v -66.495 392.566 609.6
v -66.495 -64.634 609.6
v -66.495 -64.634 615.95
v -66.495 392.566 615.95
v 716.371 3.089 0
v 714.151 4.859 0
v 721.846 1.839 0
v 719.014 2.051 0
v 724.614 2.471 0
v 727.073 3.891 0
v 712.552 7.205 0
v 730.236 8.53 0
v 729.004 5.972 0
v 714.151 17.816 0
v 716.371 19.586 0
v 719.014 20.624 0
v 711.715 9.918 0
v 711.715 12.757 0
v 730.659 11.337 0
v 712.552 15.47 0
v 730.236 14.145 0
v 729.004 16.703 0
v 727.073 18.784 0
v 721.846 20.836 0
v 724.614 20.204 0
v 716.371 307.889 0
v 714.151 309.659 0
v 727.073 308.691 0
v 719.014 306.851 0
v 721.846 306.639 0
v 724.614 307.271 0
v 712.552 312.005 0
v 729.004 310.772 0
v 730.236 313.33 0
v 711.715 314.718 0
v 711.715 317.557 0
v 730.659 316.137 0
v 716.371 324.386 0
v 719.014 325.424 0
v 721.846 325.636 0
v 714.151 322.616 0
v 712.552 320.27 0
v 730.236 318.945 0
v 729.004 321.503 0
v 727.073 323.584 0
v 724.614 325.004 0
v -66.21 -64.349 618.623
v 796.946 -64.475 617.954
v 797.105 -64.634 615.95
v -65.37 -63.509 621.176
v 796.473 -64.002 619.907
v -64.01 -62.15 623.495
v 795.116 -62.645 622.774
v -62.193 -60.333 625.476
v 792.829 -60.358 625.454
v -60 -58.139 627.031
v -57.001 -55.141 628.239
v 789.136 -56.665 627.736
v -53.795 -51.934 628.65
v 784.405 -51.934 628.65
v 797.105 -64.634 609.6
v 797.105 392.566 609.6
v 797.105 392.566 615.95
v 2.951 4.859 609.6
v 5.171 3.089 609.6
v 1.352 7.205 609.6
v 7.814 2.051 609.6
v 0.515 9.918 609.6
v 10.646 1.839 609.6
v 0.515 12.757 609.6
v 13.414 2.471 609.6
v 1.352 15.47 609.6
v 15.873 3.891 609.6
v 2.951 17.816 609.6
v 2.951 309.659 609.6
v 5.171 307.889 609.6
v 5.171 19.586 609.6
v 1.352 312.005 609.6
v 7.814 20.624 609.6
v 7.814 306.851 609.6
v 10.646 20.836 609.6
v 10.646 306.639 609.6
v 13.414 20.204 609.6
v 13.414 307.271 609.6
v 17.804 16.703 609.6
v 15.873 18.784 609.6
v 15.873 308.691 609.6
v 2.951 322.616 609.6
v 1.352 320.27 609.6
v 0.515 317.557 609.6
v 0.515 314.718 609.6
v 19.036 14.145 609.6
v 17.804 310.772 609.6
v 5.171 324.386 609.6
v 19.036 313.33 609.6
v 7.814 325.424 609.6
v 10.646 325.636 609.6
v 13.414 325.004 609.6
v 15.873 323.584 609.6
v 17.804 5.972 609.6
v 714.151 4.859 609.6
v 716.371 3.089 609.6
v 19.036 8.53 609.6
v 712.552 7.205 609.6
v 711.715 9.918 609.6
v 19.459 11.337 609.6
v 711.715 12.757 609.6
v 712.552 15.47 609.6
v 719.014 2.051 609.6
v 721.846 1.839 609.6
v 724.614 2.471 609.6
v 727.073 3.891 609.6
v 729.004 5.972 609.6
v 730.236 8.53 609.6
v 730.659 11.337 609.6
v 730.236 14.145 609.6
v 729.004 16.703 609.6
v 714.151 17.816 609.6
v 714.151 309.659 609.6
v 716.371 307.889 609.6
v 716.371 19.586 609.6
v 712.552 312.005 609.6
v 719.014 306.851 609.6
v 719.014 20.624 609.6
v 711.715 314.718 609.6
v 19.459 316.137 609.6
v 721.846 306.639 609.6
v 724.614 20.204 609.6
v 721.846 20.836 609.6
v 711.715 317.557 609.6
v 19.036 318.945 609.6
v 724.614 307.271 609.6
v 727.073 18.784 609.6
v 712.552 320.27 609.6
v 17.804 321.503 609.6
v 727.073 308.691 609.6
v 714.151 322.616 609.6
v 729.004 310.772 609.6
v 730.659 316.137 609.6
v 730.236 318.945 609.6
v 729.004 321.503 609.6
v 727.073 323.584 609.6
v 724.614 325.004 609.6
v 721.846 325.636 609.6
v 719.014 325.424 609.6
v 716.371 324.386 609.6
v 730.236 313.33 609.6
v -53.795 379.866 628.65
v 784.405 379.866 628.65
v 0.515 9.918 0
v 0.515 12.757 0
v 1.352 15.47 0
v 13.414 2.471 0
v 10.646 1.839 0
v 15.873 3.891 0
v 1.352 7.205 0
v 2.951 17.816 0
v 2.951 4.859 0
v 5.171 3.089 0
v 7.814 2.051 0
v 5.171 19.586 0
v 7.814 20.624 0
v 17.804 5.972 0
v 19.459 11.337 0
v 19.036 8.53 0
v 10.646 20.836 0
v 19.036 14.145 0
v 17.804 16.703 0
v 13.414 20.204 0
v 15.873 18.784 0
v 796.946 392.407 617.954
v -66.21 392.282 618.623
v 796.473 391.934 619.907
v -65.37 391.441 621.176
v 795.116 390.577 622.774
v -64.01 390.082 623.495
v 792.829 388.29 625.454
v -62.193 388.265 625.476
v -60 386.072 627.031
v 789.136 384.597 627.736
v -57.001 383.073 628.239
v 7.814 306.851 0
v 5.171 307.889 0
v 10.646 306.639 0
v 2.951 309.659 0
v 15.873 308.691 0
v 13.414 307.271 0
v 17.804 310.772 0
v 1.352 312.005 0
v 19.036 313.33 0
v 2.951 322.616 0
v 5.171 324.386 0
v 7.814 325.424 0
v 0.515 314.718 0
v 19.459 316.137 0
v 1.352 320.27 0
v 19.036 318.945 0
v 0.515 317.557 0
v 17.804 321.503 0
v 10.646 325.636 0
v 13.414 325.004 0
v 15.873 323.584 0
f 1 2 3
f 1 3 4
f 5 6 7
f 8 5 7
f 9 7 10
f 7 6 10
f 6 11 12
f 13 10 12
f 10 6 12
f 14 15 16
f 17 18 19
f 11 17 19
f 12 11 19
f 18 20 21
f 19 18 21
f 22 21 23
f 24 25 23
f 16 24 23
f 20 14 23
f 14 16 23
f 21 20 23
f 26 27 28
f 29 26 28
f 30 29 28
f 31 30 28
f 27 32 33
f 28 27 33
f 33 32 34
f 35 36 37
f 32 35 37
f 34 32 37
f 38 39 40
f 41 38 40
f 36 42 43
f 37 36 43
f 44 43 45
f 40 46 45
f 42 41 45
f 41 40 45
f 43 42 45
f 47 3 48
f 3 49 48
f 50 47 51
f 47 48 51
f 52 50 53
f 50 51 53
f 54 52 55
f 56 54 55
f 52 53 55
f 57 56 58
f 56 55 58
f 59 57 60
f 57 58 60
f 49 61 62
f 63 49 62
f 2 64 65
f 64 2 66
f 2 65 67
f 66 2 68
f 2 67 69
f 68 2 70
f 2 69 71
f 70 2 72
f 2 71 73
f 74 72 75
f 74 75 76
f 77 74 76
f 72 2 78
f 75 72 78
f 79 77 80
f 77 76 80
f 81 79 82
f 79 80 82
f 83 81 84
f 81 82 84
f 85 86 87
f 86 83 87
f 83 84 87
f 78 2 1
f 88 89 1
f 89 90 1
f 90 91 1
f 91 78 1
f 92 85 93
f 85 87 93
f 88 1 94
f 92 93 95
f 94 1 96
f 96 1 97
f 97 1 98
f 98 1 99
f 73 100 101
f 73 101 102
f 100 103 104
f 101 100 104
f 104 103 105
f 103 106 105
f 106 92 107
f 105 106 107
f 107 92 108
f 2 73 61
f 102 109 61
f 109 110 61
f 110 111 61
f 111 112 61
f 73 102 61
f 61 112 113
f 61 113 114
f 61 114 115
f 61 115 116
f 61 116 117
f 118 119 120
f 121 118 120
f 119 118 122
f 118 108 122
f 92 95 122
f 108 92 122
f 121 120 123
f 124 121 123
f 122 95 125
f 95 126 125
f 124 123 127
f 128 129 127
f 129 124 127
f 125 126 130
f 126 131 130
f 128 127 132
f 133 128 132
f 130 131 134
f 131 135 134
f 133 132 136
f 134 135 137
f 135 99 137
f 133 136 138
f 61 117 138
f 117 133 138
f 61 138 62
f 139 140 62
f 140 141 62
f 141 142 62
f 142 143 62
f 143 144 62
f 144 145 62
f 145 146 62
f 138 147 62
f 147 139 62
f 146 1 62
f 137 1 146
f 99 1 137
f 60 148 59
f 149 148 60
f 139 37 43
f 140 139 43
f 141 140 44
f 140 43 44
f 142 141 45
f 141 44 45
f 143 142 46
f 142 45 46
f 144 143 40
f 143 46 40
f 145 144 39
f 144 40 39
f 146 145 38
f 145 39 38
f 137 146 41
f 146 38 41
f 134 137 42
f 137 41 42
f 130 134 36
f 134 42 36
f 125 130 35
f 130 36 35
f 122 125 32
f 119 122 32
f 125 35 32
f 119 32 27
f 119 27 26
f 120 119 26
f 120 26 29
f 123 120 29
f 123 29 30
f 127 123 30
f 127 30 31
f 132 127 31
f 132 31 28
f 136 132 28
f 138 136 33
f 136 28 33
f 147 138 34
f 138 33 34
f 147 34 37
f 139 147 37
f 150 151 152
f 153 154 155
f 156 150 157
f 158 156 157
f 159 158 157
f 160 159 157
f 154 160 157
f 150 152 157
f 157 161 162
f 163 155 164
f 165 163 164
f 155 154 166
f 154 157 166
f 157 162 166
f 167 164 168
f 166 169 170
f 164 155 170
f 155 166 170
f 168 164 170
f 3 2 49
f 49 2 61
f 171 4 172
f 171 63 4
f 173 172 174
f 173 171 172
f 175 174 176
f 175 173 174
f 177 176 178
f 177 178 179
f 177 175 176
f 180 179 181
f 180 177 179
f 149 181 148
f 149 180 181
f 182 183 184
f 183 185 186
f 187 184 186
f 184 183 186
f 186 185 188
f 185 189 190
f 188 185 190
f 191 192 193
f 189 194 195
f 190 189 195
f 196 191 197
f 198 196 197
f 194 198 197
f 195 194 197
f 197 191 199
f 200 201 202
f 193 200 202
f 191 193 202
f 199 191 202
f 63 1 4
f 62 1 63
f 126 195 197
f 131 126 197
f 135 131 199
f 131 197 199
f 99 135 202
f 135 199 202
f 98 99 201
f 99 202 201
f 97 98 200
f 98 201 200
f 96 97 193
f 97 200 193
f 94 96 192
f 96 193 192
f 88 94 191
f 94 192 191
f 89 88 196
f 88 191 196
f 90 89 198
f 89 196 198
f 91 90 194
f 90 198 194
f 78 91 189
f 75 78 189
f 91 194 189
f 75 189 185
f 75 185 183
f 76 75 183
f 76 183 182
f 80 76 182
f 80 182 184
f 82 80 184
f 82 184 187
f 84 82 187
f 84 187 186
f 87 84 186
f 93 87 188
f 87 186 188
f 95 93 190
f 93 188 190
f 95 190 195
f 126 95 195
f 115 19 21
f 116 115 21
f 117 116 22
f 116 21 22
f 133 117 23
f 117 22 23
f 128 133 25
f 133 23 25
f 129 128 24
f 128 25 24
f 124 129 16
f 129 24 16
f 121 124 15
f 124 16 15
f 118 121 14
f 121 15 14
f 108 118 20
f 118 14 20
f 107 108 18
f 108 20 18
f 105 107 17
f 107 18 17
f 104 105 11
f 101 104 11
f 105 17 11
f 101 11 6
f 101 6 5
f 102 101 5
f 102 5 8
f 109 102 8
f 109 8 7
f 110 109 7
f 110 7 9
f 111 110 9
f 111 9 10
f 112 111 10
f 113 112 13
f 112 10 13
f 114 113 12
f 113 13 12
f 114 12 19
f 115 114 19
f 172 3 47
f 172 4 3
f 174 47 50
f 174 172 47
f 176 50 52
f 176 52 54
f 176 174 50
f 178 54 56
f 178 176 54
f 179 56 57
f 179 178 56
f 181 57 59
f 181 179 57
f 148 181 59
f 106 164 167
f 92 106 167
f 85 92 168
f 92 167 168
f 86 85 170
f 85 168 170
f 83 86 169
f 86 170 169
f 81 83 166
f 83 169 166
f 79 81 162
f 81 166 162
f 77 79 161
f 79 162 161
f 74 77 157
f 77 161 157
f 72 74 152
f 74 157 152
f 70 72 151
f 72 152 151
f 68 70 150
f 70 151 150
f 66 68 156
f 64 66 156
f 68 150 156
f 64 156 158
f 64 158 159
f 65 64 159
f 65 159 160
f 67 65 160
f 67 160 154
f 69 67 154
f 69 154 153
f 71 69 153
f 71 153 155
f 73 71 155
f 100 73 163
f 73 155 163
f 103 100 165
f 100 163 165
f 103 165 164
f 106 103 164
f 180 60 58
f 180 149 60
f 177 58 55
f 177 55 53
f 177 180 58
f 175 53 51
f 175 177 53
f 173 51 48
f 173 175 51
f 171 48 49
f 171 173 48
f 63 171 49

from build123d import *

# Parameters (mm, degrees)
F0_R     = 9.525
F1_DEPTH = 609.6
F2_W     = 863.6
F2_H     = 457.2
F2_R     = 9.525
F3_DEPTH = 19.05
F4_R     = 12.7


with BuildPart() as f1:
    # F0 (on Top) → F1 (new body)
    with BuildSketch(Plane.XY):
        with Locations((9.933765, 11.337449)):
            Circle(F0_R)
        with Locations((9.933765, 316.137449)):
            Circle(F0_R)
        with Locations((721.133765, 11.337449)):
            Circle(F0_R)
        with Locations((721.133765, 316.137449)):
            Circle(F0_R)
    extrude(amount=F1_DEPTH)

    # F2 (on face) → F3 (join)
    with BuildSketch(Plane.XY.offset(609.6)):
        with Locations((365.305165, 163.966049)):
            Rectangle(F2_W, F2_H)
        with Locations((9.933765, 11.337449)):
            Circle(F2_R, mode=Mode.SUBTRACT)
        with Locations((9.933765, 11.337449)):
            Circle(F2_R)
    extrude(amount=F3_DEPTH)

    # F4
    f4_edges = [f1.edges().sort_by_distance(p)[0] for p in [
        (797.105165, 163.966049, 628.65),
        (365.305165, 392.566049, 628.65),
        (-66.494835, 163.966049, 628.65),
        (365.305165, -64.633951, 628.65),
    ]]
    fillet(f4_edges, radius=F4_R)


solid = f1.part
